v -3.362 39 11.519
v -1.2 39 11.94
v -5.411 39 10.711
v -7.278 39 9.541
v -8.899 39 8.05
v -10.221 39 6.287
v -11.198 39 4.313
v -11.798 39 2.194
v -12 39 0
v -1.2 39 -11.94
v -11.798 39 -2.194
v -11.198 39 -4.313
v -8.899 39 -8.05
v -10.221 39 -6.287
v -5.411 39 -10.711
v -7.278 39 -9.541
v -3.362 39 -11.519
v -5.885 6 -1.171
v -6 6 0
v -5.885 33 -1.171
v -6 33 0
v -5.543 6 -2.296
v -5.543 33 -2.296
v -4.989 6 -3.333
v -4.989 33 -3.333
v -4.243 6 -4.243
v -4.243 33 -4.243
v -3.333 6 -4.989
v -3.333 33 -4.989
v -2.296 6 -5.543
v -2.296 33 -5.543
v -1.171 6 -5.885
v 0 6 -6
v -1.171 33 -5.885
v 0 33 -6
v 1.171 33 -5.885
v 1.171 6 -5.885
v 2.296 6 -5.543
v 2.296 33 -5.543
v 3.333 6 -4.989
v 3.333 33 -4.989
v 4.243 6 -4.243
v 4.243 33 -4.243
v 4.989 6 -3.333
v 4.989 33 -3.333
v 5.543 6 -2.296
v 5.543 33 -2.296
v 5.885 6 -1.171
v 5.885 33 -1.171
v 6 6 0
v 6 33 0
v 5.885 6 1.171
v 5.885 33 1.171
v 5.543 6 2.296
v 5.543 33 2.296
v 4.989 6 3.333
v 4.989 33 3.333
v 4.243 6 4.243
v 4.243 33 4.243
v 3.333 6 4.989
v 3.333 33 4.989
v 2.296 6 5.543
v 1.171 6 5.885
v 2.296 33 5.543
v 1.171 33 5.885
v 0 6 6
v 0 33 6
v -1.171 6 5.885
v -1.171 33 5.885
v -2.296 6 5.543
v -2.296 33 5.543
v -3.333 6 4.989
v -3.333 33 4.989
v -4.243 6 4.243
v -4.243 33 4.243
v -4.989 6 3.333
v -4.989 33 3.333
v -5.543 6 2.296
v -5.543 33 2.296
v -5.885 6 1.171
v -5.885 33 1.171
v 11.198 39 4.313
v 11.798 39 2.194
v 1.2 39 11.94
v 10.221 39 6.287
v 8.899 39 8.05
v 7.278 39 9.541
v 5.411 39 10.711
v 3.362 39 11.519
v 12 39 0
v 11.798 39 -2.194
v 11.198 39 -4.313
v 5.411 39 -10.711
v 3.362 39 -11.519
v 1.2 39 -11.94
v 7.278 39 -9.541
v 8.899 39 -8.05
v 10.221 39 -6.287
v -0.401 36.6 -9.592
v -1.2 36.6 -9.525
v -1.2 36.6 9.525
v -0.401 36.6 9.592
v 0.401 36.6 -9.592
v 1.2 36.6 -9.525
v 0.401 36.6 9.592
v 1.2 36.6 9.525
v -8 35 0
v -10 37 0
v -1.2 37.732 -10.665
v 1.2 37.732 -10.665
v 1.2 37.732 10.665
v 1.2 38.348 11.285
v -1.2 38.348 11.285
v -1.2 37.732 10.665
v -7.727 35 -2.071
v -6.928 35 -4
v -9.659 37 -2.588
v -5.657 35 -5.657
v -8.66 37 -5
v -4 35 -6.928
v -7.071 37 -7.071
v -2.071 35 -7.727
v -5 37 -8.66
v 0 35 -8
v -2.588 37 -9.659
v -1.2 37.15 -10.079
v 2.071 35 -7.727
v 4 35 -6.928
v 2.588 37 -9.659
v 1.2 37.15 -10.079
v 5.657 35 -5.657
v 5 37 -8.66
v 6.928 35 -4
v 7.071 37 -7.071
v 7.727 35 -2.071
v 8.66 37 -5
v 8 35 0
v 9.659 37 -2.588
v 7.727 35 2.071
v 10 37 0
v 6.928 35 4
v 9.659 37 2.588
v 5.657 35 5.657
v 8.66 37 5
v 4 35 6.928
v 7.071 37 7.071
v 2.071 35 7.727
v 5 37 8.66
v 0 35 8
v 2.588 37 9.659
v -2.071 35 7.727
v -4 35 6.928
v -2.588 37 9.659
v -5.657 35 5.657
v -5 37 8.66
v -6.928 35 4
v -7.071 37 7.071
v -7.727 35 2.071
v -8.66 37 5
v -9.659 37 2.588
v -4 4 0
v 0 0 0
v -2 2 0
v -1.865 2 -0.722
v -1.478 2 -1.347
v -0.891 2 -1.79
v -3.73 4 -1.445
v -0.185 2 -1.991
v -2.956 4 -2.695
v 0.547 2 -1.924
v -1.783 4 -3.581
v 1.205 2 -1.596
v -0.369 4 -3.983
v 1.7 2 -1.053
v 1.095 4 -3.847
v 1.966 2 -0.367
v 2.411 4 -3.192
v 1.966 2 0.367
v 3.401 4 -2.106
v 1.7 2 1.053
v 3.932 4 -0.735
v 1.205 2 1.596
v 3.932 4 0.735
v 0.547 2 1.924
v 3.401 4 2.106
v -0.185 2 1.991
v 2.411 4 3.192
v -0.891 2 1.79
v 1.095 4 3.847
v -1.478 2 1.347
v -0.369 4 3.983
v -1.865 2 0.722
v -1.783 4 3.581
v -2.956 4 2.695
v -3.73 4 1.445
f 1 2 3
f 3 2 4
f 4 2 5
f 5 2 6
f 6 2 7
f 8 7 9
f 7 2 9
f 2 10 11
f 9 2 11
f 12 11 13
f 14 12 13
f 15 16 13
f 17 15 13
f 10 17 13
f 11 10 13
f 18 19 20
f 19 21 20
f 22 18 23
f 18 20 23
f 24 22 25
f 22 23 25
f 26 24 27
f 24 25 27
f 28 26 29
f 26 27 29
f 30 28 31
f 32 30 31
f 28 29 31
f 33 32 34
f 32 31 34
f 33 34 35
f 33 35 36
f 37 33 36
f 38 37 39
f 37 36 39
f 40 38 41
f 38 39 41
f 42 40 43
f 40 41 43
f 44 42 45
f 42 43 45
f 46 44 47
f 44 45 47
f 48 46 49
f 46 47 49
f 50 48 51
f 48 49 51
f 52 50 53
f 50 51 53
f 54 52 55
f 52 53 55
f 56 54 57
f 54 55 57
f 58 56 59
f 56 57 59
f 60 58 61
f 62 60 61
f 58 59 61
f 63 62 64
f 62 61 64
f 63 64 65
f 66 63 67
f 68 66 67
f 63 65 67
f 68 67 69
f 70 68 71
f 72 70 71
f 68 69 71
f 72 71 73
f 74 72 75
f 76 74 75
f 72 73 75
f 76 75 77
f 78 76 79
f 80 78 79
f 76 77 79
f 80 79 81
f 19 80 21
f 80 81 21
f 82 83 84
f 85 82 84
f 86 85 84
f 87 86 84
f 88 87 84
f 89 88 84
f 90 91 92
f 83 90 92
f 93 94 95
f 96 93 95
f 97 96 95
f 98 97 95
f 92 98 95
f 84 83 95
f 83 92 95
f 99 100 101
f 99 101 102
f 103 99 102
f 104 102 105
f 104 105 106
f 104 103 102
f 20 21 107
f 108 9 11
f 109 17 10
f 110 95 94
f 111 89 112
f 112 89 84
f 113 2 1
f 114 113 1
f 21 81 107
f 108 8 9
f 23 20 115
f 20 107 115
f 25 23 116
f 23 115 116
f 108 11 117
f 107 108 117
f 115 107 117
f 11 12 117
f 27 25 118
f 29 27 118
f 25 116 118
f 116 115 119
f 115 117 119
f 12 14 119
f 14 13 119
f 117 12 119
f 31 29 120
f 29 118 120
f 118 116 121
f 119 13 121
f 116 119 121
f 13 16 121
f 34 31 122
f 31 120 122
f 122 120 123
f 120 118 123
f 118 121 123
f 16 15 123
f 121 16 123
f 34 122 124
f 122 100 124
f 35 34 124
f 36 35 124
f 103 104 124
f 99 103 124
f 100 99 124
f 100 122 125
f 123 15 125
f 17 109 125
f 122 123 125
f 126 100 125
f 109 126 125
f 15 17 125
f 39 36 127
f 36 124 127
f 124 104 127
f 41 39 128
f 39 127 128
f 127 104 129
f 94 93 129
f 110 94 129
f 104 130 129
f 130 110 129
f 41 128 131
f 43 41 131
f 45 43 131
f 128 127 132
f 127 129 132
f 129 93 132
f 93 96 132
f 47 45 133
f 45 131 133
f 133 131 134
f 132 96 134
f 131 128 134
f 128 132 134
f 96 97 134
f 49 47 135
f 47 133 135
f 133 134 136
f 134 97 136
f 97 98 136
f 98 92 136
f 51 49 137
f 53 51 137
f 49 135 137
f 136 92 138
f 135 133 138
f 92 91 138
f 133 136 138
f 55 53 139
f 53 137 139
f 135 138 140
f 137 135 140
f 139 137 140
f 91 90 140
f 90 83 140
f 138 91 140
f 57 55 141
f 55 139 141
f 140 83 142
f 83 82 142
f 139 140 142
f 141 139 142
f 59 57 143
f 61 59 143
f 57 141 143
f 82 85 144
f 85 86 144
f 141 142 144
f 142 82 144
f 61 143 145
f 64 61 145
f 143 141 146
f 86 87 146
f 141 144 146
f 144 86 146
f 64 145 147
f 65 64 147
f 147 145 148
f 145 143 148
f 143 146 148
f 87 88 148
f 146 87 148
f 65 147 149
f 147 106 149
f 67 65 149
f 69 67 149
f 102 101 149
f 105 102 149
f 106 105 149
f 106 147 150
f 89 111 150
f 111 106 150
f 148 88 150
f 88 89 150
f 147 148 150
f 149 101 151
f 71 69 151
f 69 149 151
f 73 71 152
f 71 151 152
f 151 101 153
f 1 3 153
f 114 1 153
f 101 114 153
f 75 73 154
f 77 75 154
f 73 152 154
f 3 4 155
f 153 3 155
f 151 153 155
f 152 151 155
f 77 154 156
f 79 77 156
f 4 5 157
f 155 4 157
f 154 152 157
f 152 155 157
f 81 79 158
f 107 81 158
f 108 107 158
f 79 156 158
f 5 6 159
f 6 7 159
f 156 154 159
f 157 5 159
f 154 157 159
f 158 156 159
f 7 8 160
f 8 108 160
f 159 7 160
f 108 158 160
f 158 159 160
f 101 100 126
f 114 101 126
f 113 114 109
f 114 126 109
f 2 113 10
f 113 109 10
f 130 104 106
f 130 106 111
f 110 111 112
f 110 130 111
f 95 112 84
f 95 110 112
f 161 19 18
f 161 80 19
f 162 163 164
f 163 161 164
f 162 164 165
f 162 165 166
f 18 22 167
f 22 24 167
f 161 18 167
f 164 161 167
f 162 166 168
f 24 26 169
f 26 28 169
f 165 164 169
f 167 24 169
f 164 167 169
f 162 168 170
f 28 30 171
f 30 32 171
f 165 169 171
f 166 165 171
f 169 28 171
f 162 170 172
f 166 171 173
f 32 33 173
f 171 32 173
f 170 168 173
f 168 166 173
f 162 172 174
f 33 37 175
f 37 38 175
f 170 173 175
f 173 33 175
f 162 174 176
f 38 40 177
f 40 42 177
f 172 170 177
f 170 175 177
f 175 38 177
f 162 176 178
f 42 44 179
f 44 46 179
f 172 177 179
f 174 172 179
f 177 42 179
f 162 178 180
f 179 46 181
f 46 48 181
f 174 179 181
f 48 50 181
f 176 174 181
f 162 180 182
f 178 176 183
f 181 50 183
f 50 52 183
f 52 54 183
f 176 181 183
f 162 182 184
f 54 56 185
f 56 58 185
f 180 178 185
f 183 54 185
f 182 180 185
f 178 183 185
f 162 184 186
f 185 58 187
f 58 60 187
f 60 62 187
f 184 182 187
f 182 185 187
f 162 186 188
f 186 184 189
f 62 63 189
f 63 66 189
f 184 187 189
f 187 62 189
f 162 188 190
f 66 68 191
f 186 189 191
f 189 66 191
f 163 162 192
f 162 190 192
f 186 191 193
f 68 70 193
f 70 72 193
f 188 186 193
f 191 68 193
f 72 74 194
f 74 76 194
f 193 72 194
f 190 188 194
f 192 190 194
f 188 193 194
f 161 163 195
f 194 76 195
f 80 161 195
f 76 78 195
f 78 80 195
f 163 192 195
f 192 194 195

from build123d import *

# Parameters (mm, degrees)
CUT_EXTRUDE1_DEPTH      = 43.532340636
CUT_EXTRUDE1_DEPTH_BACK = 43.532340636
SKETCH2_W               = 2.4
SKETCH2_H               = 2.4


with BuildPart() as part:
    # Sketch1 → Revolve1 (revolve)
    with BuildSketch(Plane.XY, mode=Mode.PRIVATE) as revolve1_sk:
        Polygon((0, 0), (6, 6), (6, 33), (12, 39), (0, 39), align=None)
    revolve(revolve1_sk.sketch.rotate(Axis((0, 39, 0), (0, -1, 0)), 180), axis=Axis((0, 39, 0), (0, -1, 0)))

    # Sketch2 → Cut-Extrude1 (cut, two sides: drawn at the far end of the back side and taken through both)
    with BuildSketch(Plane.XY.offset(-CUT_EXTRUDE1_DEPTH_BACK)):
        with Locations((0, 37.8)):
            Rectangle(SKETCH2_W, SKETCH2_H)
    extrude(amount=CUT_EXTRUDE1_DEPTH + CUT_EXTRUDE1_DEPTH_BACK, mode=Mode.SUBTRACT)


solid = part.part
